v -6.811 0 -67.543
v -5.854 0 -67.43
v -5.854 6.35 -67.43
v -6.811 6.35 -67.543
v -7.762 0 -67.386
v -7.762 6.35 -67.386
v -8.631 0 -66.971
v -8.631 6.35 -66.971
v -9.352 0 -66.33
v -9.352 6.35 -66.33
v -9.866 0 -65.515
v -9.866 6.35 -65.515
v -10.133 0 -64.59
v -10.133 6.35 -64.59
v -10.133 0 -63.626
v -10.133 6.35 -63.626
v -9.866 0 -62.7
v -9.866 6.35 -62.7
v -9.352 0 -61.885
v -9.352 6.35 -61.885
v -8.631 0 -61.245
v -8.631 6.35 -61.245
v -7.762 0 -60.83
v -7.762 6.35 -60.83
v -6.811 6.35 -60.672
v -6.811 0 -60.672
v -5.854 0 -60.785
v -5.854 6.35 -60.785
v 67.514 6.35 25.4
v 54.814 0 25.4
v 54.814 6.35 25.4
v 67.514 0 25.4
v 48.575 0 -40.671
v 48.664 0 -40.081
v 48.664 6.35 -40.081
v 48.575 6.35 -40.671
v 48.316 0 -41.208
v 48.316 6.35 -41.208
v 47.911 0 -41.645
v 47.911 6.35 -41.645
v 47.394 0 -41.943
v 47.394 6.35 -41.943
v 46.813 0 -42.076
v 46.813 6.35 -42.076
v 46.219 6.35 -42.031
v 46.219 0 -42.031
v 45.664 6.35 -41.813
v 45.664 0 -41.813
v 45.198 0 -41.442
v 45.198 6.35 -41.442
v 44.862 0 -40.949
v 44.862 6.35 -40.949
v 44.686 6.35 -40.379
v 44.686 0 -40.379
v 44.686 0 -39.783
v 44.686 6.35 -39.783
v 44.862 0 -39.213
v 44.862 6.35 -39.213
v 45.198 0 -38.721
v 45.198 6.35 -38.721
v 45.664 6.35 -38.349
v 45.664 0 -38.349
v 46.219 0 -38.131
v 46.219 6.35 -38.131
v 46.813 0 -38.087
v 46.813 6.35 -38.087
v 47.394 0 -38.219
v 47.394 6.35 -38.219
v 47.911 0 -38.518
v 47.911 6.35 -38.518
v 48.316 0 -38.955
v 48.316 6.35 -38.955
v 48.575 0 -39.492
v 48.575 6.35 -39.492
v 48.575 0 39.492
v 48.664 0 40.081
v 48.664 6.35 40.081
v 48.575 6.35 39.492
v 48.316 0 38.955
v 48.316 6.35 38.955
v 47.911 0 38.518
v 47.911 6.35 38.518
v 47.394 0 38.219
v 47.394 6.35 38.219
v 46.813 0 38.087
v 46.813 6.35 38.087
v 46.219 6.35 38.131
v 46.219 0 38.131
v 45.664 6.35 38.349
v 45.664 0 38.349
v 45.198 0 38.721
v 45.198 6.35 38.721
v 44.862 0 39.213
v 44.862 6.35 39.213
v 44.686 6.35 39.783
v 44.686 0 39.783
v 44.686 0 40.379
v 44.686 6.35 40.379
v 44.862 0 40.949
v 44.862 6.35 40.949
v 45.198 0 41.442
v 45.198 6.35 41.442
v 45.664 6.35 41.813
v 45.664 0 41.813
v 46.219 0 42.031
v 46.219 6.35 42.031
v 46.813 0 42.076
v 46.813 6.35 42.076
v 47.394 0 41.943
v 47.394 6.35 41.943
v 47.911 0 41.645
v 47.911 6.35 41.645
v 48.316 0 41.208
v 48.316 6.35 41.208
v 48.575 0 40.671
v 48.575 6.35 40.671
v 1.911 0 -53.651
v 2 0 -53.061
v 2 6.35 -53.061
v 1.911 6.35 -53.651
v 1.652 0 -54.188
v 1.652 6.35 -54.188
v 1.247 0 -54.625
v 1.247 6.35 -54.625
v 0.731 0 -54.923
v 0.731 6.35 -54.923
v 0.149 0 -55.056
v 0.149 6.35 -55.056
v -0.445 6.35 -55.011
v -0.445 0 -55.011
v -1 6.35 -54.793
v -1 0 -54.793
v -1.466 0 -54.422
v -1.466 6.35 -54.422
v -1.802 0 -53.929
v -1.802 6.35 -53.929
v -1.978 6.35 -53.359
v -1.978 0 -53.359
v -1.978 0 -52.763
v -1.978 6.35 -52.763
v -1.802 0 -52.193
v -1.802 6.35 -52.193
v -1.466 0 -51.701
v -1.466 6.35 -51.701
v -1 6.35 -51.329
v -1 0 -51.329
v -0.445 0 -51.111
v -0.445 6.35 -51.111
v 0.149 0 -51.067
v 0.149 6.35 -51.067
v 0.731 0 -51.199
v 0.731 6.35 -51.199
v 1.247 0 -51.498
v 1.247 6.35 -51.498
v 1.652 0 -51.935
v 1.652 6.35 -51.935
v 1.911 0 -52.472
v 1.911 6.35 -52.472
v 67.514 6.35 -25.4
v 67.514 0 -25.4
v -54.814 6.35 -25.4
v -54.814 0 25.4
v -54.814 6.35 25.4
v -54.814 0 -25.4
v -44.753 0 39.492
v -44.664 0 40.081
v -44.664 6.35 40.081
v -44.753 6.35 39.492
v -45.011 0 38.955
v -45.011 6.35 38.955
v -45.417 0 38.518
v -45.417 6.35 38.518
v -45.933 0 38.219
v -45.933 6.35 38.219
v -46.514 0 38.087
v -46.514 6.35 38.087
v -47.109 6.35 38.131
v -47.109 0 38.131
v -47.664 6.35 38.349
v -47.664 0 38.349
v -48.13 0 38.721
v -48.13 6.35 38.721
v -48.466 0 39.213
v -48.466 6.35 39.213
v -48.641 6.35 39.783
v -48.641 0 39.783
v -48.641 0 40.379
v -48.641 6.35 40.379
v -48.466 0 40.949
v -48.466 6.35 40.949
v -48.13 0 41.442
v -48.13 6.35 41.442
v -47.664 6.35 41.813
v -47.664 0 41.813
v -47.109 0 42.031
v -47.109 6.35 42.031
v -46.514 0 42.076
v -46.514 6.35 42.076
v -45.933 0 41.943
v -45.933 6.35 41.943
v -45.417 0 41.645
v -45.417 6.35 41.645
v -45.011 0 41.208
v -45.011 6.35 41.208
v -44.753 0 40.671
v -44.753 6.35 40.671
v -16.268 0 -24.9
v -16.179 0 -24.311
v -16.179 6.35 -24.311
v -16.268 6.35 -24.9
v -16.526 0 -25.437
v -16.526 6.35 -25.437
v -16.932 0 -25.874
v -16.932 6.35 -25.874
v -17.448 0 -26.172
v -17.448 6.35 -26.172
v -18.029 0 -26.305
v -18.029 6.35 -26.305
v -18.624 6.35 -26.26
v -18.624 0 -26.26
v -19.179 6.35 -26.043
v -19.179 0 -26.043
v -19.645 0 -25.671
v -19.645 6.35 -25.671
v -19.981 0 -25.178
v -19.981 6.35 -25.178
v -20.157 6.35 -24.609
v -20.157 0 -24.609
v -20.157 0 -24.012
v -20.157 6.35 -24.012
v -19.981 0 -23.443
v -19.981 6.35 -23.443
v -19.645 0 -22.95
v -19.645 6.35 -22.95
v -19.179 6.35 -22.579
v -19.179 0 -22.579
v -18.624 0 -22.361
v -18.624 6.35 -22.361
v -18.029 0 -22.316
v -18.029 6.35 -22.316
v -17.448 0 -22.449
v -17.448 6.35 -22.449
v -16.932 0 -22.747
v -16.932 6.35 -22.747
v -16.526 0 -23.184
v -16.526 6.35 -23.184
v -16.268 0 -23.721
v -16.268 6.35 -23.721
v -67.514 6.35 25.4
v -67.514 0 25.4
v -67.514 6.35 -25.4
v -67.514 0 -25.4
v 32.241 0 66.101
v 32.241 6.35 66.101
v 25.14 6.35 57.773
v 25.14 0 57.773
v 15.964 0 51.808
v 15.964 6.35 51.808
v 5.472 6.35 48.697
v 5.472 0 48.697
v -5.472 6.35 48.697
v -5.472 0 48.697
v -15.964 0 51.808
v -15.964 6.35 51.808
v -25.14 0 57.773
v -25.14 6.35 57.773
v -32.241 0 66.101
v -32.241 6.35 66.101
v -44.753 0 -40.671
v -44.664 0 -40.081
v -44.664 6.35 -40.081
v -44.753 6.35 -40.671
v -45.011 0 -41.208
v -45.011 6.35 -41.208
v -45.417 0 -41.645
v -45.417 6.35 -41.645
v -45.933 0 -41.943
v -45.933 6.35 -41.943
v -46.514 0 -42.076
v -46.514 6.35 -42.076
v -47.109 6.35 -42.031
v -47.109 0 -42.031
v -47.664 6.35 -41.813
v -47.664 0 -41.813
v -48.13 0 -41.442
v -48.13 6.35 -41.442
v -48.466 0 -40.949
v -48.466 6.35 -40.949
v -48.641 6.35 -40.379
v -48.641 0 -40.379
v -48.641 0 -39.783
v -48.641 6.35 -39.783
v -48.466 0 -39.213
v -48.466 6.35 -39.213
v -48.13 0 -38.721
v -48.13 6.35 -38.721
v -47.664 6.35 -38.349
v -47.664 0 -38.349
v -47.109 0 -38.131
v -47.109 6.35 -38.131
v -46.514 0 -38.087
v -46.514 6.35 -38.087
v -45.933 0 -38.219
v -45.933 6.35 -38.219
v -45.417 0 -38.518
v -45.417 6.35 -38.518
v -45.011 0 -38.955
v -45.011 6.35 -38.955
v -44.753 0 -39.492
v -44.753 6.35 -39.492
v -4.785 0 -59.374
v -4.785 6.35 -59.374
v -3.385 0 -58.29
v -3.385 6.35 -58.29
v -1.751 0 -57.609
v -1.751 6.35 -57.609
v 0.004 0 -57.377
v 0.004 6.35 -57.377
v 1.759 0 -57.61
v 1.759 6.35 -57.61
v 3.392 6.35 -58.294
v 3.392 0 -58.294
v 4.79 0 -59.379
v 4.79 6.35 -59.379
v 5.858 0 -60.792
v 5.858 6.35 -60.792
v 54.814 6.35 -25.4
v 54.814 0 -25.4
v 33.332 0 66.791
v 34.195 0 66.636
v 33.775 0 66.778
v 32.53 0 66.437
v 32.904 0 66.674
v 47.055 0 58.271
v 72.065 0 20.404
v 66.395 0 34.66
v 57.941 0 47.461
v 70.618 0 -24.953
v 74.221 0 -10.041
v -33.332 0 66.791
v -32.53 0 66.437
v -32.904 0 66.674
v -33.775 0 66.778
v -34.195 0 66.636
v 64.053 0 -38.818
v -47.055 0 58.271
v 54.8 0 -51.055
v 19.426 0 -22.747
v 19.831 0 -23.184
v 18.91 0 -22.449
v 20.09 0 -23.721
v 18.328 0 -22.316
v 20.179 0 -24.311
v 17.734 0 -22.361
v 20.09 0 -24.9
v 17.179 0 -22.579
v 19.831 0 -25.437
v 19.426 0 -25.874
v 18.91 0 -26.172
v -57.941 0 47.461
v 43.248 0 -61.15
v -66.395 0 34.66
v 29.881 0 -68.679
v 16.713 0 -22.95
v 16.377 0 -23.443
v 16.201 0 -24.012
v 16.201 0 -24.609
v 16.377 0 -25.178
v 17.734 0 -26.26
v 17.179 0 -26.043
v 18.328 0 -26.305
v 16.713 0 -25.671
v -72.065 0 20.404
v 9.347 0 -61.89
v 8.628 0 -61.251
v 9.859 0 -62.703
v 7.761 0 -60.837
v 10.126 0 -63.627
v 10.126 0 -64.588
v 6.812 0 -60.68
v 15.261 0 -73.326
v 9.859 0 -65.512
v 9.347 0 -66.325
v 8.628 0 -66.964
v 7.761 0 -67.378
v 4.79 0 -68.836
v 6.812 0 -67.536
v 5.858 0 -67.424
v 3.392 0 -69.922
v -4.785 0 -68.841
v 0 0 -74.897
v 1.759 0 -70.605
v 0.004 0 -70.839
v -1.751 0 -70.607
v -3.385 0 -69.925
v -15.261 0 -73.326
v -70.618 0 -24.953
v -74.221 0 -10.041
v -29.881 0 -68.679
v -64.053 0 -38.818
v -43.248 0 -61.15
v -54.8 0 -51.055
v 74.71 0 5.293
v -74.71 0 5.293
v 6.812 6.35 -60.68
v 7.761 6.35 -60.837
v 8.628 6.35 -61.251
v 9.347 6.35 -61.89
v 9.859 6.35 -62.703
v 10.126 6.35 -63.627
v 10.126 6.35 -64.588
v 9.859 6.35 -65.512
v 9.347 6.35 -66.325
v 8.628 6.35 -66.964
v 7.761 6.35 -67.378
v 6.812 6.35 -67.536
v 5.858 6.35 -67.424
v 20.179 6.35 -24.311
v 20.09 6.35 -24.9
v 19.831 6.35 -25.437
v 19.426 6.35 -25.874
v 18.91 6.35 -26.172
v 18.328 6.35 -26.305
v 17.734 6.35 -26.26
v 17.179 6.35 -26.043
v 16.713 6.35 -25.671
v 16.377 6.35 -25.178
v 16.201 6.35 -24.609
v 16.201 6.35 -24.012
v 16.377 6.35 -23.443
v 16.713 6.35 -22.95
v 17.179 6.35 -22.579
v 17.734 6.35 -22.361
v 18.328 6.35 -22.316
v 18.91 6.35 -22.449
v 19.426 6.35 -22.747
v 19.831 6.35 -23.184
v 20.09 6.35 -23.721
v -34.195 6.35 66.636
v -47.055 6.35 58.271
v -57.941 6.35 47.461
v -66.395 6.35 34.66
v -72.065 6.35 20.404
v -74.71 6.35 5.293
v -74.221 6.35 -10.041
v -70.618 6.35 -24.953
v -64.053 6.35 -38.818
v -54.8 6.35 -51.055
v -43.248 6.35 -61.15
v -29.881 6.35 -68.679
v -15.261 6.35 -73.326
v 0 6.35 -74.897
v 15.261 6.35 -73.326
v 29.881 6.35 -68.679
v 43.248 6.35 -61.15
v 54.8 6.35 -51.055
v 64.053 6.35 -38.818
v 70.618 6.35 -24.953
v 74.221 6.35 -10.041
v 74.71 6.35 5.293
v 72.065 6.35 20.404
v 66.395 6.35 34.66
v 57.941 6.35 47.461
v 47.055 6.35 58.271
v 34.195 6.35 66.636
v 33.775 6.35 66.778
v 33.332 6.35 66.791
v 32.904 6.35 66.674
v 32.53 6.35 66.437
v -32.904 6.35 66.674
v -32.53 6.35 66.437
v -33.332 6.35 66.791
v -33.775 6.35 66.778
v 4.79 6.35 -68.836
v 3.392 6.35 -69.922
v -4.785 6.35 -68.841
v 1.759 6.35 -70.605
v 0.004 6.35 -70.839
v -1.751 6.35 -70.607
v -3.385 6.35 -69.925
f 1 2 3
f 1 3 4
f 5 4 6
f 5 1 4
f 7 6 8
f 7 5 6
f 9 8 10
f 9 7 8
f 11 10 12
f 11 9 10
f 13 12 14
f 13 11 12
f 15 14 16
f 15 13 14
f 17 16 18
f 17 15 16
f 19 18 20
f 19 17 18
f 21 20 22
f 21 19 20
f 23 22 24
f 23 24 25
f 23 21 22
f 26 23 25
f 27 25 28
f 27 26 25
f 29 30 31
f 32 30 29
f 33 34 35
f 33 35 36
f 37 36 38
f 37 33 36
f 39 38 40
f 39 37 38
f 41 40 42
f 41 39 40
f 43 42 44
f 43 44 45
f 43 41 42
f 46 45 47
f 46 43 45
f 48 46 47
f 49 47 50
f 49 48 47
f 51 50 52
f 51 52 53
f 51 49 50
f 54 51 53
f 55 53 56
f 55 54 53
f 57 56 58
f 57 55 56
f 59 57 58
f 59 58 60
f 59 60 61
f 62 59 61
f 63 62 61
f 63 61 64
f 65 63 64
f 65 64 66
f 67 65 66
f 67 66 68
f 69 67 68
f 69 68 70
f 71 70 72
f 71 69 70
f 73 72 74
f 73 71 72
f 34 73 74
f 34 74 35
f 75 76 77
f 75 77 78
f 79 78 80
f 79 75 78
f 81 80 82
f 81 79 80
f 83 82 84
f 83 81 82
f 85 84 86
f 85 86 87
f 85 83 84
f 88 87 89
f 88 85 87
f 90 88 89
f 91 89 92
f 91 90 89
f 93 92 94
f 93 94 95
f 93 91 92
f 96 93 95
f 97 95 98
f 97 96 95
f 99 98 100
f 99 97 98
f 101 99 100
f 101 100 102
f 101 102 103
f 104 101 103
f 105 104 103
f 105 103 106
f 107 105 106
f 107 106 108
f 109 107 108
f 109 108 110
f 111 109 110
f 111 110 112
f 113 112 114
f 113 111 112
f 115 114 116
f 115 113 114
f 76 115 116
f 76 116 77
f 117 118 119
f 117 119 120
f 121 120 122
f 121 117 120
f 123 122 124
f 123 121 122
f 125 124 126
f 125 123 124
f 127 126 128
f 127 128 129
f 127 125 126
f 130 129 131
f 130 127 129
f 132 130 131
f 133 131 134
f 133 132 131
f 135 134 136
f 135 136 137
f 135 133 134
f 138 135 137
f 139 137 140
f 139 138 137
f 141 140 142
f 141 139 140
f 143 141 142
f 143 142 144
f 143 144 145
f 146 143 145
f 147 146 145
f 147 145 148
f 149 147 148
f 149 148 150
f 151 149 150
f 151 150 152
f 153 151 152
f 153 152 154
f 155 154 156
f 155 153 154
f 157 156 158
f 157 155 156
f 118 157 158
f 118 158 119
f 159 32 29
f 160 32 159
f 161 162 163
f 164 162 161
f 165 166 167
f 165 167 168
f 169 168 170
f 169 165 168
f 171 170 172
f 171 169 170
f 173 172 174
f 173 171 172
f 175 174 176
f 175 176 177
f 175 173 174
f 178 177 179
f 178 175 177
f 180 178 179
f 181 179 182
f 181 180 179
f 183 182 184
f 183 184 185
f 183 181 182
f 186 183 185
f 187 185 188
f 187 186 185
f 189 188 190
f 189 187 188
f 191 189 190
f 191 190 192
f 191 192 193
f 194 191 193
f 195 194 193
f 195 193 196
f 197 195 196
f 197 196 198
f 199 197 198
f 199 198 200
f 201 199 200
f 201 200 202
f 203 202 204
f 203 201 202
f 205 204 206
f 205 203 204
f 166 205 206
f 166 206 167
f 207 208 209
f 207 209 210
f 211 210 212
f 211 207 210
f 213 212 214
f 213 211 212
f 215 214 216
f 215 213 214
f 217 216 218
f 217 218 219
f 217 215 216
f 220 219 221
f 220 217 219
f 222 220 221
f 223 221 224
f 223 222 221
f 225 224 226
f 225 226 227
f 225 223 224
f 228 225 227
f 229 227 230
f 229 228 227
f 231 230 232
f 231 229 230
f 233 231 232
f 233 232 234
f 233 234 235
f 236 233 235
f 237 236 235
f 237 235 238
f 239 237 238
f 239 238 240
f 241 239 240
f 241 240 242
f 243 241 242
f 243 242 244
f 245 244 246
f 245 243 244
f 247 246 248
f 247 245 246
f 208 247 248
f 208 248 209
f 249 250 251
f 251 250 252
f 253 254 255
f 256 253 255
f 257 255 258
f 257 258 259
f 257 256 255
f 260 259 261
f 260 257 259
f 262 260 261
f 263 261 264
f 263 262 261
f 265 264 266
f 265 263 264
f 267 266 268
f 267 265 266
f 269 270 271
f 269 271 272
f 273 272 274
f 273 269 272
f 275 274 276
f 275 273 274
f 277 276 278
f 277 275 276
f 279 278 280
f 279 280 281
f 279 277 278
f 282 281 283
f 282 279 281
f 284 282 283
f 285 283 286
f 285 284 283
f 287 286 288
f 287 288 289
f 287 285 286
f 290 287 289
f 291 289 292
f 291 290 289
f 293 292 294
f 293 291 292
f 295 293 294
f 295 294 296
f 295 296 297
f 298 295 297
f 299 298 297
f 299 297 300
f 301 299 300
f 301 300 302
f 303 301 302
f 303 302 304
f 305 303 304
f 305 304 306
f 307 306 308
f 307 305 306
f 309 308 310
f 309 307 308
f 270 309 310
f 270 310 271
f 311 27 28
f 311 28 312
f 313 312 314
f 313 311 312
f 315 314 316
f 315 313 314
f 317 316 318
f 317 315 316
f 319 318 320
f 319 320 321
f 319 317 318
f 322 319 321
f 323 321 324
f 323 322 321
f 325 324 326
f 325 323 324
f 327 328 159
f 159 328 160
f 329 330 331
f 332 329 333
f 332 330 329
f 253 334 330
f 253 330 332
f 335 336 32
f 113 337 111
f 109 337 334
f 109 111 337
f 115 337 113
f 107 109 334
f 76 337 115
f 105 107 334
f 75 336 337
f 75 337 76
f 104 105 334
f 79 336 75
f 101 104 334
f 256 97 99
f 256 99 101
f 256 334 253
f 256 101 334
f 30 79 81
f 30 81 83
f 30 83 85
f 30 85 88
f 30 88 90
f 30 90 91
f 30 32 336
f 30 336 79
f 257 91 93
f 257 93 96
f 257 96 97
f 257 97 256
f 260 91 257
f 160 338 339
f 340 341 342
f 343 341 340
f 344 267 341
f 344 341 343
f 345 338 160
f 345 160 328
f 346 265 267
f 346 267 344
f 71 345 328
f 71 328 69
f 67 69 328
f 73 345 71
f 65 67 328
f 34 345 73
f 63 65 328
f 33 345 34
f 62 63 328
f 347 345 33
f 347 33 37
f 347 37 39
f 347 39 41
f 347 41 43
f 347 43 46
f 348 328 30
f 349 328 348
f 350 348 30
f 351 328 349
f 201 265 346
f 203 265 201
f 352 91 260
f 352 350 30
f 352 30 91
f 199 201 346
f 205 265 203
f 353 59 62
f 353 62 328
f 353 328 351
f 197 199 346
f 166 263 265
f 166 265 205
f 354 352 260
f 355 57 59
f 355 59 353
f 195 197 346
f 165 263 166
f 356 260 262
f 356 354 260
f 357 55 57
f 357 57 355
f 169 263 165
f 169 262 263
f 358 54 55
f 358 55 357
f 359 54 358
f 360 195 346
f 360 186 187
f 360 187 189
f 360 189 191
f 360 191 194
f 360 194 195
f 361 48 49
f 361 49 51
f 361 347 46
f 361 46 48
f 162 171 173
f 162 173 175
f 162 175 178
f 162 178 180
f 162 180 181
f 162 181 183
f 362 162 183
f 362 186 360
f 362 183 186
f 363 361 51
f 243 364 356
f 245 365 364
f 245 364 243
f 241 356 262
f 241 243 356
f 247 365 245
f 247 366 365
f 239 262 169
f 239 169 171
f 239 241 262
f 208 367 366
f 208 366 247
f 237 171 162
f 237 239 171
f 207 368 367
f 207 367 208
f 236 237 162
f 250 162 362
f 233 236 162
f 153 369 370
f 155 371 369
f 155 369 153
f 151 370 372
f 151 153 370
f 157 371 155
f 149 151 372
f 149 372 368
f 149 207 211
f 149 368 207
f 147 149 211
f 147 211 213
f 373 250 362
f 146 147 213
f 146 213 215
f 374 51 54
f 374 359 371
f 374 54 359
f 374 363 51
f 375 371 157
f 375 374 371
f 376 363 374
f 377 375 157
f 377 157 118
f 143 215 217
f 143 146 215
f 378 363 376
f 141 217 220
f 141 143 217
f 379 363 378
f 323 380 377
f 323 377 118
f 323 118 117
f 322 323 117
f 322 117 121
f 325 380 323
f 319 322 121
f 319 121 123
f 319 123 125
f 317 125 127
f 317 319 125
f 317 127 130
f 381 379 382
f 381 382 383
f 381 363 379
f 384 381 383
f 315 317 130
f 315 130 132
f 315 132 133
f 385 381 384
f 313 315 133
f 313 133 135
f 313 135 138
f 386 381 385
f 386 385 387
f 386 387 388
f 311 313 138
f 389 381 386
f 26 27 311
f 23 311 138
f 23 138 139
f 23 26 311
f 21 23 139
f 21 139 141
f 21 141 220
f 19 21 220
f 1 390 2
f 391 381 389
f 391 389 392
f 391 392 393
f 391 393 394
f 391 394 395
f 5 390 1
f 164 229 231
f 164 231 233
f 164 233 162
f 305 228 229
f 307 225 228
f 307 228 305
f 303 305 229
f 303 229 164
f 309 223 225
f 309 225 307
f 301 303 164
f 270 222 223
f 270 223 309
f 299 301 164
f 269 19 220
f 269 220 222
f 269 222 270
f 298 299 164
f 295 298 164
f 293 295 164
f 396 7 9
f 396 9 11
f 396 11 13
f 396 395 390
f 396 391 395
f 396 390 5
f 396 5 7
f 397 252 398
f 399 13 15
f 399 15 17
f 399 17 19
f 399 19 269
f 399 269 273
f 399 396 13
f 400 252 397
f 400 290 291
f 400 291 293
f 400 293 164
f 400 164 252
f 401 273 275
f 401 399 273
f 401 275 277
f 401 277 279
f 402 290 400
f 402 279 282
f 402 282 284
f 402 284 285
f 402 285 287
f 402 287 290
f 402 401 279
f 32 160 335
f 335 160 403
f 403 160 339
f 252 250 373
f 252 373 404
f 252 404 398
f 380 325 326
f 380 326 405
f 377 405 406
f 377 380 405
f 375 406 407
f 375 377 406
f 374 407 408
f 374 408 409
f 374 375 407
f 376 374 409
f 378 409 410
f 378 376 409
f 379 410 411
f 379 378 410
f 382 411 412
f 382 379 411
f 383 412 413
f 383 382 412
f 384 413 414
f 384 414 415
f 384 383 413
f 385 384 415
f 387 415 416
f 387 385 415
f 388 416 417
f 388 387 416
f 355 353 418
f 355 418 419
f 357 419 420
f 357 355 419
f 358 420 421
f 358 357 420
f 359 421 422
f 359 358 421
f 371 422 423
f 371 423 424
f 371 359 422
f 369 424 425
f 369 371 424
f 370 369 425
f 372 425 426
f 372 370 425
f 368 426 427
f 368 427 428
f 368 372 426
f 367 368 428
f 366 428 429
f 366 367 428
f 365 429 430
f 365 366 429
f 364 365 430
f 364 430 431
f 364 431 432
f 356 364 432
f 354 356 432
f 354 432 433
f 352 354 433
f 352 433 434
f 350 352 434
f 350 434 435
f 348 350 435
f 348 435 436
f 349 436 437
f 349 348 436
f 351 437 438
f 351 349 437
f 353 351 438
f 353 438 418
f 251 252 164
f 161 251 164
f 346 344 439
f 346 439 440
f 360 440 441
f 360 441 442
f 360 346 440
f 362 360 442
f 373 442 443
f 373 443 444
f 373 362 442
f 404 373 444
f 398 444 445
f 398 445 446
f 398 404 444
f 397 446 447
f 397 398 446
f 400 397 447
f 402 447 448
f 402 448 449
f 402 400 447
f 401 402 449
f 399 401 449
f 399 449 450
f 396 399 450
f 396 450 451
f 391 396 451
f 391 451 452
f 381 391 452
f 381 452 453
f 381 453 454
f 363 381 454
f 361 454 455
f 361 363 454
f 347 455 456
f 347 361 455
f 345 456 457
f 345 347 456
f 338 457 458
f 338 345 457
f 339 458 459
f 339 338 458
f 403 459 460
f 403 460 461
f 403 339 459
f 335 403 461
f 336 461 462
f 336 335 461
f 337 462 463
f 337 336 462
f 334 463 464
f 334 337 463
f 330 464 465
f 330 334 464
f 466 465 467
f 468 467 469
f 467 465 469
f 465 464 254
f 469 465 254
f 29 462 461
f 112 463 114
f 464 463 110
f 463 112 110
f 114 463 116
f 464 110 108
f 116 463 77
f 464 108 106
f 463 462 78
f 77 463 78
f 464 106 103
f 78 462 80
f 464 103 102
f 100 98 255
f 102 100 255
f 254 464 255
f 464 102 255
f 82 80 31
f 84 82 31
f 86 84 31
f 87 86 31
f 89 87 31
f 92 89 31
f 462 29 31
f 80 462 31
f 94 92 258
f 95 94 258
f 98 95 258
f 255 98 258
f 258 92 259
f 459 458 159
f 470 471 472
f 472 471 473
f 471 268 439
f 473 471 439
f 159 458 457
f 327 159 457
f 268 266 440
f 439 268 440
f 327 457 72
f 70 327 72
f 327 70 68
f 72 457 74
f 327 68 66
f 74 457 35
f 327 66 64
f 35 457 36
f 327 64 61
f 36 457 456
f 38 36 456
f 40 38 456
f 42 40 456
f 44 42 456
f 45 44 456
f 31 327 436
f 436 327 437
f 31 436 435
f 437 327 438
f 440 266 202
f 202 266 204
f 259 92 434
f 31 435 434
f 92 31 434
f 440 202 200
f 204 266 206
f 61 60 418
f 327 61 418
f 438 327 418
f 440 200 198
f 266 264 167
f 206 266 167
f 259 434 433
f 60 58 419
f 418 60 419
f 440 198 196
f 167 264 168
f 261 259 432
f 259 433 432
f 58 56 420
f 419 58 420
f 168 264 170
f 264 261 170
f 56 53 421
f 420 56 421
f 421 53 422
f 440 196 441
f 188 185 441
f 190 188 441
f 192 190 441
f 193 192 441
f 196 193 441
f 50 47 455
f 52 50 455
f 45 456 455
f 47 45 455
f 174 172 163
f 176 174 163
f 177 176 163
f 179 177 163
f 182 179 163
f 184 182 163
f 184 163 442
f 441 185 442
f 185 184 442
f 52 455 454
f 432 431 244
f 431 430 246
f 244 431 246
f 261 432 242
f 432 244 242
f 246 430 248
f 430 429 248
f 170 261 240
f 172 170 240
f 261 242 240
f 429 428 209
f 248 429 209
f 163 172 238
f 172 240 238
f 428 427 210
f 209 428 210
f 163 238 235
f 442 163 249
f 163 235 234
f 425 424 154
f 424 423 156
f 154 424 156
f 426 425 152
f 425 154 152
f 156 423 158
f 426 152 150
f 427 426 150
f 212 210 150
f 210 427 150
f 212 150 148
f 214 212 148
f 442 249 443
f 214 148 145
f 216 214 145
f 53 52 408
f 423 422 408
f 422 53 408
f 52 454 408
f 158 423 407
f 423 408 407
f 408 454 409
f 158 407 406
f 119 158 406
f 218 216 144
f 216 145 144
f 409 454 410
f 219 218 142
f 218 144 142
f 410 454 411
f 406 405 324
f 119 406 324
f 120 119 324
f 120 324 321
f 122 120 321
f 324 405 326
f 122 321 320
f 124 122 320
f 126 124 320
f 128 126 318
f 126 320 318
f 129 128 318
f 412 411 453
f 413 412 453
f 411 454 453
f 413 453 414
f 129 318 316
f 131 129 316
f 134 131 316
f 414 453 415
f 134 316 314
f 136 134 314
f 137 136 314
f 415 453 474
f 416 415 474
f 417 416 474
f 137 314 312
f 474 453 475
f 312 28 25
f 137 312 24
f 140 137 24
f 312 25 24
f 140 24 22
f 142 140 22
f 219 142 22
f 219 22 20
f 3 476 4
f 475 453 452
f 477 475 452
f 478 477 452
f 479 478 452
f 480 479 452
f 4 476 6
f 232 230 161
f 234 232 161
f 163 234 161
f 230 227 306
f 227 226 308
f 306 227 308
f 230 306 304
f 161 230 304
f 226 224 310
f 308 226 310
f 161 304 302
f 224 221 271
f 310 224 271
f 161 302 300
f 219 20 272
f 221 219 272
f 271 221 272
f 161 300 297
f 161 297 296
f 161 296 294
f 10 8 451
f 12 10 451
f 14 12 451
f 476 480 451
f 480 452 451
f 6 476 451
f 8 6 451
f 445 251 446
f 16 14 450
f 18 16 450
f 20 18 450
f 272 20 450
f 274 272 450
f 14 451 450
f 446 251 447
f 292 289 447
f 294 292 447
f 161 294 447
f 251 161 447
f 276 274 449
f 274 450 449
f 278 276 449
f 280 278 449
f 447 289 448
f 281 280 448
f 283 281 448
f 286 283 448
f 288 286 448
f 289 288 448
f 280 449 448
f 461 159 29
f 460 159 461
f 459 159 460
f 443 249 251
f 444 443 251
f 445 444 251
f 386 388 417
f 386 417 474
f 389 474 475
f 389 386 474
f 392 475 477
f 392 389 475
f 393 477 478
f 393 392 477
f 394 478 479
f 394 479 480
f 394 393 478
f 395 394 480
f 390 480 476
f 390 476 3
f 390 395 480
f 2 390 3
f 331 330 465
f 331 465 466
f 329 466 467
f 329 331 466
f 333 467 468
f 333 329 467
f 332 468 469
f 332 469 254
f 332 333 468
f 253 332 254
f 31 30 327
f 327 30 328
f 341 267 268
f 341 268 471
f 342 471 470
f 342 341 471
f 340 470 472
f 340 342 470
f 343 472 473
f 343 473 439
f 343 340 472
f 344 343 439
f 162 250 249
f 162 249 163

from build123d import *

# Parameters (mm, degrees)
SKETCH1_R           = 2
SKETCH1_W           = 12.7
SKETCH1_H           = 50.8
BOSS_EXTRUDE3_DEPTH = 6.35


with BuildPart() as part:
    # Sketch1 → Boss-Extrude3 (new body)
    with BuildSketch(Plane(origin=(0, 0, 0), x_dir=(1, 0, 0), z_dir=(0, 1, 0))):
        with BuildLine():
            ThreePointArc((34.194833578, -66.63583839), (33.11372382, -66.748004461), (32.240681933, -66.10056535))
            ThreePointArc((32.240681933, -66.10056535), (0, -48.302004425), (-32.240681933, -66.10056535))
            ThreePointArc((-32.240681933, -66.10056535), (-33.11372382, -66.748004461), (-34.194833578, -66.63583839))
            ThreePointArc((-34.194833578, -66.63583839), (0, 74.897407173), (34.194833578, -66.63583839))
        make_face()
        with Locations((0, 53.061187965)):
            Circle(SKETCH1_R, mode=Mode.SUBTRACT)
        with Locations((18.178952795, 24.310551096)):
            Circle(SKETCH1_R, mode=Mode.SUBTRACT)
        with Locations((46.663733983, 40.081231883)):
            Circle(SKETCH1_R, mode=Mode.SUBTRACT)
        with Locations((46.663733983, -40.081231883)):
            Circle(SKETCH1_R, mode=Mode.SUBTRACT)
        with Locations((-46.663733983, -40.081231883)):
            Circle(SKETCH1_R, mode=Mode.SUBTRACT)
        with Locations((-18.178952795, 24.310551096)):
            Circle(SKETCH1_R, mode=Mode.SUBTRACT)
        with Locations((-46.663733983, 40.081231883)):
            Circle(SKETCH1_R, mode=Mode.SUBTRACT)
        with Locations((61.164123727, 0)):
            Rectangle(SKETCH1_W, SKETCH1_H, mode=Mode.SUBTRACT)
        with Locations((-61.164123727, 0)):
            Rectangle(SKETCH1_W, SKETCH1_H, mode=Mode.SUBTRACT)
        with BuildLine():
            ThreePointArc((-5.853899988, 60.78531778), (0.003726822, 57.376699875), (5.857575472, 60.791802193))
            ThreePointArc((5.857575472, 60.791802193), (10.16, 64.107698843), (5.857575472, 67.423595493))
            ThreePointArc((5.857575472, 67.423595493), (0.003726822, 70.838697812), (-5.853899988, 67.430079907))
            ThreePointArc((-5.853899988, 67.430079907), (-10.167207264, 64.107698843), (-5.853899988, 60.78531778))
        make_face(mode=Mode.SUBTRACT)
    extrude(amount=BOSS_EXTRUDE3_DEPTH)


solid = part.part
